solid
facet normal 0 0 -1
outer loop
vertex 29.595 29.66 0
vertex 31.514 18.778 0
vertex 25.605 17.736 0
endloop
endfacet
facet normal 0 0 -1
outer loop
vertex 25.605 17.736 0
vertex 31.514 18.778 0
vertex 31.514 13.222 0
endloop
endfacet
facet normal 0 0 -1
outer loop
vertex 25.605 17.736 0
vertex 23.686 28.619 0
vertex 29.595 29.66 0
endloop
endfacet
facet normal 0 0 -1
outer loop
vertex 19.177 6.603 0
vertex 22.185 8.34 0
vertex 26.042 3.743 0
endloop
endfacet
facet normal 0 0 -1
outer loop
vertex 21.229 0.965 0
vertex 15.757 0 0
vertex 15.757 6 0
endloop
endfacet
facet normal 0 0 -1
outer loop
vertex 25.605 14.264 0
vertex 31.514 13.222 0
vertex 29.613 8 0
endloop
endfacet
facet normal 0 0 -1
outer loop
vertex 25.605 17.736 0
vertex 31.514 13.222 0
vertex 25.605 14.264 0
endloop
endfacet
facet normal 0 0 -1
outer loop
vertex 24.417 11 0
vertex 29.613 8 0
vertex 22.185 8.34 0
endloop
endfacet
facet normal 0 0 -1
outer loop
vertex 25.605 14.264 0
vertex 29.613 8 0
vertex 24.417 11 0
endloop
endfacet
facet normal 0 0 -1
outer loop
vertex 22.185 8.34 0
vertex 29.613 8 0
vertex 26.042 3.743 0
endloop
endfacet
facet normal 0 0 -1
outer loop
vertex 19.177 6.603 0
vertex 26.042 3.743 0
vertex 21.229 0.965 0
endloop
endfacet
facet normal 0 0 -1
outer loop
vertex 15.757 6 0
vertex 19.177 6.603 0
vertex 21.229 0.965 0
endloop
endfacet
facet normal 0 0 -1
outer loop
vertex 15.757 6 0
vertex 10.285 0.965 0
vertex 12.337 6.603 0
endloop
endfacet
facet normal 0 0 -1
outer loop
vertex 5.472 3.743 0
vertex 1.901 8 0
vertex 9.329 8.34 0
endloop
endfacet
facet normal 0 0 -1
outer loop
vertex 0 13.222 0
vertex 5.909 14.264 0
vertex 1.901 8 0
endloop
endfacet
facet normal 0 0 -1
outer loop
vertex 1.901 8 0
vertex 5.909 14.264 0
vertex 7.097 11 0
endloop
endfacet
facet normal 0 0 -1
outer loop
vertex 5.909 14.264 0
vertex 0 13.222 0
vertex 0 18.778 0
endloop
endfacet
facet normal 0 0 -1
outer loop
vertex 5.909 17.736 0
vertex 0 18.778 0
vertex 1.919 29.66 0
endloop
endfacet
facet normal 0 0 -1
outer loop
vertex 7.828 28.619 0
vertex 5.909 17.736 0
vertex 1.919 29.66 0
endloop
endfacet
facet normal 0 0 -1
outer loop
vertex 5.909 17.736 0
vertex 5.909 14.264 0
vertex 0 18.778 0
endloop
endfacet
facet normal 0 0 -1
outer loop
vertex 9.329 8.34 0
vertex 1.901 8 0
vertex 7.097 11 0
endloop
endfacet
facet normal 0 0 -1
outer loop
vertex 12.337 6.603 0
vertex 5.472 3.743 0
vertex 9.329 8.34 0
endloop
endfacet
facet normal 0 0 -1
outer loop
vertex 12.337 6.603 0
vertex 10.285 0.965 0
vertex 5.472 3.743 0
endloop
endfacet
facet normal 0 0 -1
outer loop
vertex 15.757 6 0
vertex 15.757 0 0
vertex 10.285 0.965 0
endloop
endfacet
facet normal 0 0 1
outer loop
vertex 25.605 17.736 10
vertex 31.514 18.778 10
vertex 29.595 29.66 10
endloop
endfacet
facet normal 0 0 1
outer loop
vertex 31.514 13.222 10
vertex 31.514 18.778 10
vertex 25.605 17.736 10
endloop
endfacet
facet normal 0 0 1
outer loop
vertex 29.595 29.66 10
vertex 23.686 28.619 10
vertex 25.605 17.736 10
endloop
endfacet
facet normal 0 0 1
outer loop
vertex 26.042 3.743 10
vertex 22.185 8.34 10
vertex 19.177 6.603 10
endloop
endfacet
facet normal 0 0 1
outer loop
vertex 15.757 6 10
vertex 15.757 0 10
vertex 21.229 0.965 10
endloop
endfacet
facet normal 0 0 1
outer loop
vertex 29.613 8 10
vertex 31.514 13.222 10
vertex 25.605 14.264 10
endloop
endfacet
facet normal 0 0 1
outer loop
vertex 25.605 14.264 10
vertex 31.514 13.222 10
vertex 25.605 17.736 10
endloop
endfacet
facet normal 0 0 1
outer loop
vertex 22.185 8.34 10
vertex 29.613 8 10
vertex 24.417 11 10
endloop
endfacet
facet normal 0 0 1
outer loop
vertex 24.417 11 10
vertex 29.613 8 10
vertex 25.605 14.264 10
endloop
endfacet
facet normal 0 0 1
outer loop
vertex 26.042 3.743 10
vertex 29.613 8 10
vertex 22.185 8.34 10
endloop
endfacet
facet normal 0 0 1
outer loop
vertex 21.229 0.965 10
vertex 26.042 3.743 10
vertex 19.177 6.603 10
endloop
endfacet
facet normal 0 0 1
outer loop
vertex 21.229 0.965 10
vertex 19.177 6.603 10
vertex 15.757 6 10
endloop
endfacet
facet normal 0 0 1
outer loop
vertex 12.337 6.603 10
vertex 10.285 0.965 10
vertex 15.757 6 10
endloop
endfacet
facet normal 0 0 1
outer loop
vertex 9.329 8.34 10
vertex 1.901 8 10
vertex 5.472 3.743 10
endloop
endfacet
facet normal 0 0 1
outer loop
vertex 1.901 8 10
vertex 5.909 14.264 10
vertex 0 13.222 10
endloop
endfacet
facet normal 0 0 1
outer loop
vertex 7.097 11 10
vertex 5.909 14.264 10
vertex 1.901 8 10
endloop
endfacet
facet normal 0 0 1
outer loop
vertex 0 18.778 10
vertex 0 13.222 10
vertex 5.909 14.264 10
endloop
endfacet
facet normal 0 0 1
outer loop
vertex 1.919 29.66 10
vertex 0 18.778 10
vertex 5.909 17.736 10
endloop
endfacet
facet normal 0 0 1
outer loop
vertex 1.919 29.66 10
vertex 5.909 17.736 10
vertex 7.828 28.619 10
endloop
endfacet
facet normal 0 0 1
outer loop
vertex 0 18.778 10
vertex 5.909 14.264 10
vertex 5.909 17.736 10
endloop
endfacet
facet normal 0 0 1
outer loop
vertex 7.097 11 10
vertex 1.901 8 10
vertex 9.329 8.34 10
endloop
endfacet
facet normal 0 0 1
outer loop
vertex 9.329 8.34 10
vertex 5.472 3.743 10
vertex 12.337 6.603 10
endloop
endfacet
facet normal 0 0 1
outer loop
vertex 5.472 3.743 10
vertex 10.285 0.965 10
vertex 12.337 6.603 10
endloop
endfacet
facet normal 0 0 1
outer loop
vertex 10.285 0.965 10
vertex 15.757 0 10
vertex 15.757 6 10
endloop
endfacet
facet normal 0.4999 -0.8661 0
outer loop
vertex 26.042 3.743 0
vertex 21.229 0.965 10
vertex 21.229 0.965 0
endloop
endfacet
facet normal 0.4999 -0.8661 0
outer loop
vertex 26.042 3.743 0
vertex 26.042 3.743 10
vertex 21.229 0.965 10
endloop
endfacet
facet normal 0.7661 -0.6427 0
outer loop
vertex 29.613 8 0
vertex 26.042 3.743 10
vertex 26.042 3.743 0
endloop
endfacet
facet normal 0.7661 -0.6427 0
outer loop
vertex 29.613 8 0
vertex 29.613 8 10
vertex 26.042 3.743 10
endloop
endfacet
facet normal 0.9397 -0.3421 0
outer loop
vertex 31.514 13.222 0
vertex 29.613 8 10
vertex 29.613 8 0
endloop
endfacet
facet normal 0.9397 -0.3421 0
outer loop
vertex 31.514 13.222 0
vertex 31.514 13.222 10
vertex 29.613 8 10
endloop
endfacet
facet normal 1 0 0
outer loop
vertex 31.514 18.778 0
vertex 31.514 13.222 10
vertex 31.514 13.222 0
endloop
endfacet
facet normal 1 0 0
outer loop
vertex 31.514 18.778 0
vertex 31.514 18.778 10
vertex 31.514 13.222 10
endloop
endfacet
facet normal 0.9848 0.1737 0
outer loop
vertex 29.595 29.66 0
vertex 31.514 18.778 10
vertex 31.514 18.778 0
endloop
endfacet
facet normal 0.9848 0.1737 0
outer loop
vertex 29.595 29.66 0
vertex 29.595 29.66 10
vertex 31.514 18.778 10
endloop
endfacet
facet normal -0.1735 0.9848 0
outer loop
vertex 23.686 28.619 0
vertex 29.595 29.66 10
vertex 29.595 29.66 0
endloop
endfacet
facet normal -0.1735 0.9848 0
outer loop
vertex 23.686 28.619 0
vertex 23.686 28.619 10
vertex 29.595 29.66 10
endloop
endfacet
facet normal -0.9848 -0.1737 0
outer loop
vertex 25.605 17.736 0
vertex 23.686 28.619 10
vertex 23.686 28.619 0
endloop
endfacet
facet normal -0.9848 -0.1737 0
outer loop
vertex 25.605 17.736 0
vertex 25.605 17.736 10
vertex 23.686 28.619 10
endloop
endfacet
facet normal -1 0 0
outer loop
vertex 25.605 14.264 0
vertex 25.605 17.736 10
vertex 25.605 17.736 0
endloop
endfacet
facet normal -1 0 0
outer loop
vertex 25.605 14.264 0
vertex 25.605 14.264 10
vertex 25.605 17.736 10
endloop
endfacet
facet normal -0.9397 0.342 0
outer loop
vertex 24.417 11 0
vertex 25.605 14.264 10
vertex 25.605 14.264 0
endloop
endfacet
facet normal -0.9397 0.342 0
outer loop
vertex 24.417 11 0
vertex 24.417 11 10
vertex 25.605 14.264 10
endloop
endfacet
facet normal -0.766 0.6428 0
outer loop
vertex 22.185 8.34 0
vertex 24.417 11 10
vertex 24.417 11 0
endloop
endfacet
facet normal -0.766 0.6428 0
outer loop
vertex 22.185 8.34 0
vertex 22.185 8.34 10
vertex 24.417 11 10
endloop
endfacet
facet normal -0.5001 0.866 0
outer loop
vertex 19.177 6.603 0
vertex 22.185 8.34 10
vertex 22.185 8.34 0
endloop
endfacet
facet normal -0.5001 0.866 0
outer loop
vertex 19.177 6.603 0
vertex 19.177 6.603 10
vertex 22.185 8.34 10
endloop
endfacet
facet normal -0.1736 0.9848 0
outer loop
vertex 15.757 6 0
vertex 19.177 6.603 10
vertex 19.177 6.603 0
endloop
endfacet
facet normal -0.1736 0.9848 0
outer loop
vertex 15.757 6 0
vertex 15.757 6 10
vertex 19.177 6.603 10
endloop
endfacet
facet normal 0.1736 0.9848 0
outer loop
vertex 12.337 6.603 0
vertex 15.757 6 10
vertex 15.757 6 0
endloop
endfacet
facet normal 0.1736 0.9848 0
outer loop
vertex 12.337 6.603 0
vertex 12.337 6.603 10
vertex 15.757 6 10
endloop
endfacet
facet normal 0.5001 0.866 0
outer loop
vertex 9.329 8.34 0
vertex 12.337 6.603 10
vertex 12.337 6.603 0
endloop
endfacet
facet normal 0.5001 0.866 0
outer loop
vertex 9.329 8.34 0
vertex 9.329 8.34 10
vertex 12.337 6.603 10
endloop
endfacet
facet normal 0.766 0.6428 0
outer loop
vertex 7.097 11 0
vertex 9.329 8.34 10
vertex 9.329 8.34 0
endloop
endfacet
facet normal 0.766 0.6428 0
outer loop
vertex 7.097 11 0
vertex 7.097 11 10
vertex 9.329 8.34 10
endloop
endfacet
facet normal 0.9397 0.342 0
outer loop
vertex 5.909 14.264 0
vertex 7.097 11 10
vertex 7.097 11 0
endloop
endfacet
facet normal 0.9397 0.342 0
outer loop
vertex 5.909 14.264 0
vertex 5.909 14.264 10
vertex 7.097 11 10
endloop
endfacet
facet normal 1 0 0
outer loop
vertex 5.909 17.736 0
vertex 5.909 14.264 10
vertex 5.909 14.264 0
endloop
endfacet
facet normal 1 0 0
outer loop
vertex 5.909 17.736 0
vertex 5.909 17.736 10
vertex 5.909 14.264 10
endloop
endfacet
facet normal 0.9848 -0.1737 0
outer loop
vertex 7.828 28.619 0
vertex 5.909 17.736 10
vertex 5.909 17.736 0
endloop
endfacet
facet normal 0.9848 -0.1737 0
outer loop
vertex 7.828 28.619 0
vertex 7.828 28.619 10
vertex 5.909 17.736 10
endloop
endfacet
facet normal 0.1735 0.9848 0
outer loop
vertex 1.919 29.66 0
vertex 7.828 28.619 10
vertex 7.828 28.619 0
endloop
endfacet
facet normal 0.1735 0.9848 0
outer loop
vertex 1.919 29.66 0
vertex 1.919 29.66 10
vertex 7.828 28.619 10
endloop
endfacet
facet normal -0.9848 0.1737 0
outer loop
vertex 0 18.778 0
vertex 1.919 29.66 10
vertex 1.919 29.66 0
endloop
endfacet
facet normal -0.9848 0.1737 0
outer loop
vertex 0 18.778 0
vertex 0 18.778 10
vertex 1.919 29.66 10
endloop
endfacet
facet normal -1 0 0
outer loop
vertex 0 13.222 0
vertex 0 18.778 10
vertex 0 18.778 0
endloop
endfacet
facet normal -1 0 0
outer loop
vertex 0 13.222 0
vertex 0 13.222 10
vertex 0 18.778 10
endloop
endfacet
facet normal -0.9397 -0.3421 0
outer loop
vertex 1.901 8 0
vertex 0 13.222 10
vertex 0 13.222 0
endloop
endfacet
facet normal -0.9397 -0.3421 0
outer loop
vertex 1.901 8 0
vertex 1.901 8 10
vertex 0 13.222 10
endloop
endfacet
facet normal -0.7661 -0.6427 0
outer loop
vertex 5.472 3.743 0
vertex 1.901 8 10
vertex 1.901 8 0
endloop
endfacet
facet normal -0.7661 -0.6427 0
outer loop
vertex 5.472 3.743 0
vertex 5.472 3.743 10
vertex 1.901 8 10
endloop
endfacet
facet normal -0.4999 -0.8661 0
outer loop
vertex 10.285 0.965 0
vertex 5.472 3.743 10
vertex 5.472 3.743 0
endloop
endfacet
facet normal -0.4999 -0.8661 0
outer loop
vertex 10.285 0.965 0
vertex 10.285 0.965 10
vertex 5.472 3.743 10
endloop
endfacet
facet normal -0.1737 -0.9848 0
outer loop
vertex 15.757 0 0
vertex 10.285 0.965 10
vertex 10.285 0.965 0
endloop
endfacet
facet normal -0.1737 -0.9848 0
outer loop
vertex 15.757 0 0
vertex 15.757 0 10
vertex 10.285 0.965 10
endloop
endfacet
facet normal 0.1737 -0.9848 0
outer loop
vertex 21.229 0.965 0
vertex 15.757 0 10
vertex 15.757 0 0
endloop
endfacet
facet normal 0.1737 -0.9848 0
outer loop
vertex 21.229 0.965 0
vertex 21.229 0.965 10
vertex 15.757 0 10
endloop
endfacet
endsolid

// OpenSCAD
$fn = 32;

// ----------------------------------------------------------------------
// Clip blank: omega clip, 10 mm thick
// ----------------------------------------------------------------------

// --- parameters (mm) ---
profile_height = 10;      // extrusion height
profile_points = 26;      // points of the closed outline

profile = [[0, 18.778], [0, 13.222], [1.901, 8], [5.472, 3.743], [10.285, 0.965], [15.757, 0], [21.229, 0.965], [26.042, 3.743], [29.613, 8], [31.514, 13.222], [31.514, 18.778], [29.595, 29.66], [23.686, 28.619], [25.605, 17.736], [25.605, 14.264], [24.417, 11], [22.185, 8.34], [19.177, 6.603], [15.757, 6], [12.337, 6.603], [9.329, 8.34], [7.097, 11], [5.909, 14.264], [5.909, 17.736], [7.828, 28.619], [1.919, 29.66]];  // single closed polygon, 26 points, counter clockwise

// --- the one profile operation ---
linear_extrude(height = profile_height) polygon(points = profile);
